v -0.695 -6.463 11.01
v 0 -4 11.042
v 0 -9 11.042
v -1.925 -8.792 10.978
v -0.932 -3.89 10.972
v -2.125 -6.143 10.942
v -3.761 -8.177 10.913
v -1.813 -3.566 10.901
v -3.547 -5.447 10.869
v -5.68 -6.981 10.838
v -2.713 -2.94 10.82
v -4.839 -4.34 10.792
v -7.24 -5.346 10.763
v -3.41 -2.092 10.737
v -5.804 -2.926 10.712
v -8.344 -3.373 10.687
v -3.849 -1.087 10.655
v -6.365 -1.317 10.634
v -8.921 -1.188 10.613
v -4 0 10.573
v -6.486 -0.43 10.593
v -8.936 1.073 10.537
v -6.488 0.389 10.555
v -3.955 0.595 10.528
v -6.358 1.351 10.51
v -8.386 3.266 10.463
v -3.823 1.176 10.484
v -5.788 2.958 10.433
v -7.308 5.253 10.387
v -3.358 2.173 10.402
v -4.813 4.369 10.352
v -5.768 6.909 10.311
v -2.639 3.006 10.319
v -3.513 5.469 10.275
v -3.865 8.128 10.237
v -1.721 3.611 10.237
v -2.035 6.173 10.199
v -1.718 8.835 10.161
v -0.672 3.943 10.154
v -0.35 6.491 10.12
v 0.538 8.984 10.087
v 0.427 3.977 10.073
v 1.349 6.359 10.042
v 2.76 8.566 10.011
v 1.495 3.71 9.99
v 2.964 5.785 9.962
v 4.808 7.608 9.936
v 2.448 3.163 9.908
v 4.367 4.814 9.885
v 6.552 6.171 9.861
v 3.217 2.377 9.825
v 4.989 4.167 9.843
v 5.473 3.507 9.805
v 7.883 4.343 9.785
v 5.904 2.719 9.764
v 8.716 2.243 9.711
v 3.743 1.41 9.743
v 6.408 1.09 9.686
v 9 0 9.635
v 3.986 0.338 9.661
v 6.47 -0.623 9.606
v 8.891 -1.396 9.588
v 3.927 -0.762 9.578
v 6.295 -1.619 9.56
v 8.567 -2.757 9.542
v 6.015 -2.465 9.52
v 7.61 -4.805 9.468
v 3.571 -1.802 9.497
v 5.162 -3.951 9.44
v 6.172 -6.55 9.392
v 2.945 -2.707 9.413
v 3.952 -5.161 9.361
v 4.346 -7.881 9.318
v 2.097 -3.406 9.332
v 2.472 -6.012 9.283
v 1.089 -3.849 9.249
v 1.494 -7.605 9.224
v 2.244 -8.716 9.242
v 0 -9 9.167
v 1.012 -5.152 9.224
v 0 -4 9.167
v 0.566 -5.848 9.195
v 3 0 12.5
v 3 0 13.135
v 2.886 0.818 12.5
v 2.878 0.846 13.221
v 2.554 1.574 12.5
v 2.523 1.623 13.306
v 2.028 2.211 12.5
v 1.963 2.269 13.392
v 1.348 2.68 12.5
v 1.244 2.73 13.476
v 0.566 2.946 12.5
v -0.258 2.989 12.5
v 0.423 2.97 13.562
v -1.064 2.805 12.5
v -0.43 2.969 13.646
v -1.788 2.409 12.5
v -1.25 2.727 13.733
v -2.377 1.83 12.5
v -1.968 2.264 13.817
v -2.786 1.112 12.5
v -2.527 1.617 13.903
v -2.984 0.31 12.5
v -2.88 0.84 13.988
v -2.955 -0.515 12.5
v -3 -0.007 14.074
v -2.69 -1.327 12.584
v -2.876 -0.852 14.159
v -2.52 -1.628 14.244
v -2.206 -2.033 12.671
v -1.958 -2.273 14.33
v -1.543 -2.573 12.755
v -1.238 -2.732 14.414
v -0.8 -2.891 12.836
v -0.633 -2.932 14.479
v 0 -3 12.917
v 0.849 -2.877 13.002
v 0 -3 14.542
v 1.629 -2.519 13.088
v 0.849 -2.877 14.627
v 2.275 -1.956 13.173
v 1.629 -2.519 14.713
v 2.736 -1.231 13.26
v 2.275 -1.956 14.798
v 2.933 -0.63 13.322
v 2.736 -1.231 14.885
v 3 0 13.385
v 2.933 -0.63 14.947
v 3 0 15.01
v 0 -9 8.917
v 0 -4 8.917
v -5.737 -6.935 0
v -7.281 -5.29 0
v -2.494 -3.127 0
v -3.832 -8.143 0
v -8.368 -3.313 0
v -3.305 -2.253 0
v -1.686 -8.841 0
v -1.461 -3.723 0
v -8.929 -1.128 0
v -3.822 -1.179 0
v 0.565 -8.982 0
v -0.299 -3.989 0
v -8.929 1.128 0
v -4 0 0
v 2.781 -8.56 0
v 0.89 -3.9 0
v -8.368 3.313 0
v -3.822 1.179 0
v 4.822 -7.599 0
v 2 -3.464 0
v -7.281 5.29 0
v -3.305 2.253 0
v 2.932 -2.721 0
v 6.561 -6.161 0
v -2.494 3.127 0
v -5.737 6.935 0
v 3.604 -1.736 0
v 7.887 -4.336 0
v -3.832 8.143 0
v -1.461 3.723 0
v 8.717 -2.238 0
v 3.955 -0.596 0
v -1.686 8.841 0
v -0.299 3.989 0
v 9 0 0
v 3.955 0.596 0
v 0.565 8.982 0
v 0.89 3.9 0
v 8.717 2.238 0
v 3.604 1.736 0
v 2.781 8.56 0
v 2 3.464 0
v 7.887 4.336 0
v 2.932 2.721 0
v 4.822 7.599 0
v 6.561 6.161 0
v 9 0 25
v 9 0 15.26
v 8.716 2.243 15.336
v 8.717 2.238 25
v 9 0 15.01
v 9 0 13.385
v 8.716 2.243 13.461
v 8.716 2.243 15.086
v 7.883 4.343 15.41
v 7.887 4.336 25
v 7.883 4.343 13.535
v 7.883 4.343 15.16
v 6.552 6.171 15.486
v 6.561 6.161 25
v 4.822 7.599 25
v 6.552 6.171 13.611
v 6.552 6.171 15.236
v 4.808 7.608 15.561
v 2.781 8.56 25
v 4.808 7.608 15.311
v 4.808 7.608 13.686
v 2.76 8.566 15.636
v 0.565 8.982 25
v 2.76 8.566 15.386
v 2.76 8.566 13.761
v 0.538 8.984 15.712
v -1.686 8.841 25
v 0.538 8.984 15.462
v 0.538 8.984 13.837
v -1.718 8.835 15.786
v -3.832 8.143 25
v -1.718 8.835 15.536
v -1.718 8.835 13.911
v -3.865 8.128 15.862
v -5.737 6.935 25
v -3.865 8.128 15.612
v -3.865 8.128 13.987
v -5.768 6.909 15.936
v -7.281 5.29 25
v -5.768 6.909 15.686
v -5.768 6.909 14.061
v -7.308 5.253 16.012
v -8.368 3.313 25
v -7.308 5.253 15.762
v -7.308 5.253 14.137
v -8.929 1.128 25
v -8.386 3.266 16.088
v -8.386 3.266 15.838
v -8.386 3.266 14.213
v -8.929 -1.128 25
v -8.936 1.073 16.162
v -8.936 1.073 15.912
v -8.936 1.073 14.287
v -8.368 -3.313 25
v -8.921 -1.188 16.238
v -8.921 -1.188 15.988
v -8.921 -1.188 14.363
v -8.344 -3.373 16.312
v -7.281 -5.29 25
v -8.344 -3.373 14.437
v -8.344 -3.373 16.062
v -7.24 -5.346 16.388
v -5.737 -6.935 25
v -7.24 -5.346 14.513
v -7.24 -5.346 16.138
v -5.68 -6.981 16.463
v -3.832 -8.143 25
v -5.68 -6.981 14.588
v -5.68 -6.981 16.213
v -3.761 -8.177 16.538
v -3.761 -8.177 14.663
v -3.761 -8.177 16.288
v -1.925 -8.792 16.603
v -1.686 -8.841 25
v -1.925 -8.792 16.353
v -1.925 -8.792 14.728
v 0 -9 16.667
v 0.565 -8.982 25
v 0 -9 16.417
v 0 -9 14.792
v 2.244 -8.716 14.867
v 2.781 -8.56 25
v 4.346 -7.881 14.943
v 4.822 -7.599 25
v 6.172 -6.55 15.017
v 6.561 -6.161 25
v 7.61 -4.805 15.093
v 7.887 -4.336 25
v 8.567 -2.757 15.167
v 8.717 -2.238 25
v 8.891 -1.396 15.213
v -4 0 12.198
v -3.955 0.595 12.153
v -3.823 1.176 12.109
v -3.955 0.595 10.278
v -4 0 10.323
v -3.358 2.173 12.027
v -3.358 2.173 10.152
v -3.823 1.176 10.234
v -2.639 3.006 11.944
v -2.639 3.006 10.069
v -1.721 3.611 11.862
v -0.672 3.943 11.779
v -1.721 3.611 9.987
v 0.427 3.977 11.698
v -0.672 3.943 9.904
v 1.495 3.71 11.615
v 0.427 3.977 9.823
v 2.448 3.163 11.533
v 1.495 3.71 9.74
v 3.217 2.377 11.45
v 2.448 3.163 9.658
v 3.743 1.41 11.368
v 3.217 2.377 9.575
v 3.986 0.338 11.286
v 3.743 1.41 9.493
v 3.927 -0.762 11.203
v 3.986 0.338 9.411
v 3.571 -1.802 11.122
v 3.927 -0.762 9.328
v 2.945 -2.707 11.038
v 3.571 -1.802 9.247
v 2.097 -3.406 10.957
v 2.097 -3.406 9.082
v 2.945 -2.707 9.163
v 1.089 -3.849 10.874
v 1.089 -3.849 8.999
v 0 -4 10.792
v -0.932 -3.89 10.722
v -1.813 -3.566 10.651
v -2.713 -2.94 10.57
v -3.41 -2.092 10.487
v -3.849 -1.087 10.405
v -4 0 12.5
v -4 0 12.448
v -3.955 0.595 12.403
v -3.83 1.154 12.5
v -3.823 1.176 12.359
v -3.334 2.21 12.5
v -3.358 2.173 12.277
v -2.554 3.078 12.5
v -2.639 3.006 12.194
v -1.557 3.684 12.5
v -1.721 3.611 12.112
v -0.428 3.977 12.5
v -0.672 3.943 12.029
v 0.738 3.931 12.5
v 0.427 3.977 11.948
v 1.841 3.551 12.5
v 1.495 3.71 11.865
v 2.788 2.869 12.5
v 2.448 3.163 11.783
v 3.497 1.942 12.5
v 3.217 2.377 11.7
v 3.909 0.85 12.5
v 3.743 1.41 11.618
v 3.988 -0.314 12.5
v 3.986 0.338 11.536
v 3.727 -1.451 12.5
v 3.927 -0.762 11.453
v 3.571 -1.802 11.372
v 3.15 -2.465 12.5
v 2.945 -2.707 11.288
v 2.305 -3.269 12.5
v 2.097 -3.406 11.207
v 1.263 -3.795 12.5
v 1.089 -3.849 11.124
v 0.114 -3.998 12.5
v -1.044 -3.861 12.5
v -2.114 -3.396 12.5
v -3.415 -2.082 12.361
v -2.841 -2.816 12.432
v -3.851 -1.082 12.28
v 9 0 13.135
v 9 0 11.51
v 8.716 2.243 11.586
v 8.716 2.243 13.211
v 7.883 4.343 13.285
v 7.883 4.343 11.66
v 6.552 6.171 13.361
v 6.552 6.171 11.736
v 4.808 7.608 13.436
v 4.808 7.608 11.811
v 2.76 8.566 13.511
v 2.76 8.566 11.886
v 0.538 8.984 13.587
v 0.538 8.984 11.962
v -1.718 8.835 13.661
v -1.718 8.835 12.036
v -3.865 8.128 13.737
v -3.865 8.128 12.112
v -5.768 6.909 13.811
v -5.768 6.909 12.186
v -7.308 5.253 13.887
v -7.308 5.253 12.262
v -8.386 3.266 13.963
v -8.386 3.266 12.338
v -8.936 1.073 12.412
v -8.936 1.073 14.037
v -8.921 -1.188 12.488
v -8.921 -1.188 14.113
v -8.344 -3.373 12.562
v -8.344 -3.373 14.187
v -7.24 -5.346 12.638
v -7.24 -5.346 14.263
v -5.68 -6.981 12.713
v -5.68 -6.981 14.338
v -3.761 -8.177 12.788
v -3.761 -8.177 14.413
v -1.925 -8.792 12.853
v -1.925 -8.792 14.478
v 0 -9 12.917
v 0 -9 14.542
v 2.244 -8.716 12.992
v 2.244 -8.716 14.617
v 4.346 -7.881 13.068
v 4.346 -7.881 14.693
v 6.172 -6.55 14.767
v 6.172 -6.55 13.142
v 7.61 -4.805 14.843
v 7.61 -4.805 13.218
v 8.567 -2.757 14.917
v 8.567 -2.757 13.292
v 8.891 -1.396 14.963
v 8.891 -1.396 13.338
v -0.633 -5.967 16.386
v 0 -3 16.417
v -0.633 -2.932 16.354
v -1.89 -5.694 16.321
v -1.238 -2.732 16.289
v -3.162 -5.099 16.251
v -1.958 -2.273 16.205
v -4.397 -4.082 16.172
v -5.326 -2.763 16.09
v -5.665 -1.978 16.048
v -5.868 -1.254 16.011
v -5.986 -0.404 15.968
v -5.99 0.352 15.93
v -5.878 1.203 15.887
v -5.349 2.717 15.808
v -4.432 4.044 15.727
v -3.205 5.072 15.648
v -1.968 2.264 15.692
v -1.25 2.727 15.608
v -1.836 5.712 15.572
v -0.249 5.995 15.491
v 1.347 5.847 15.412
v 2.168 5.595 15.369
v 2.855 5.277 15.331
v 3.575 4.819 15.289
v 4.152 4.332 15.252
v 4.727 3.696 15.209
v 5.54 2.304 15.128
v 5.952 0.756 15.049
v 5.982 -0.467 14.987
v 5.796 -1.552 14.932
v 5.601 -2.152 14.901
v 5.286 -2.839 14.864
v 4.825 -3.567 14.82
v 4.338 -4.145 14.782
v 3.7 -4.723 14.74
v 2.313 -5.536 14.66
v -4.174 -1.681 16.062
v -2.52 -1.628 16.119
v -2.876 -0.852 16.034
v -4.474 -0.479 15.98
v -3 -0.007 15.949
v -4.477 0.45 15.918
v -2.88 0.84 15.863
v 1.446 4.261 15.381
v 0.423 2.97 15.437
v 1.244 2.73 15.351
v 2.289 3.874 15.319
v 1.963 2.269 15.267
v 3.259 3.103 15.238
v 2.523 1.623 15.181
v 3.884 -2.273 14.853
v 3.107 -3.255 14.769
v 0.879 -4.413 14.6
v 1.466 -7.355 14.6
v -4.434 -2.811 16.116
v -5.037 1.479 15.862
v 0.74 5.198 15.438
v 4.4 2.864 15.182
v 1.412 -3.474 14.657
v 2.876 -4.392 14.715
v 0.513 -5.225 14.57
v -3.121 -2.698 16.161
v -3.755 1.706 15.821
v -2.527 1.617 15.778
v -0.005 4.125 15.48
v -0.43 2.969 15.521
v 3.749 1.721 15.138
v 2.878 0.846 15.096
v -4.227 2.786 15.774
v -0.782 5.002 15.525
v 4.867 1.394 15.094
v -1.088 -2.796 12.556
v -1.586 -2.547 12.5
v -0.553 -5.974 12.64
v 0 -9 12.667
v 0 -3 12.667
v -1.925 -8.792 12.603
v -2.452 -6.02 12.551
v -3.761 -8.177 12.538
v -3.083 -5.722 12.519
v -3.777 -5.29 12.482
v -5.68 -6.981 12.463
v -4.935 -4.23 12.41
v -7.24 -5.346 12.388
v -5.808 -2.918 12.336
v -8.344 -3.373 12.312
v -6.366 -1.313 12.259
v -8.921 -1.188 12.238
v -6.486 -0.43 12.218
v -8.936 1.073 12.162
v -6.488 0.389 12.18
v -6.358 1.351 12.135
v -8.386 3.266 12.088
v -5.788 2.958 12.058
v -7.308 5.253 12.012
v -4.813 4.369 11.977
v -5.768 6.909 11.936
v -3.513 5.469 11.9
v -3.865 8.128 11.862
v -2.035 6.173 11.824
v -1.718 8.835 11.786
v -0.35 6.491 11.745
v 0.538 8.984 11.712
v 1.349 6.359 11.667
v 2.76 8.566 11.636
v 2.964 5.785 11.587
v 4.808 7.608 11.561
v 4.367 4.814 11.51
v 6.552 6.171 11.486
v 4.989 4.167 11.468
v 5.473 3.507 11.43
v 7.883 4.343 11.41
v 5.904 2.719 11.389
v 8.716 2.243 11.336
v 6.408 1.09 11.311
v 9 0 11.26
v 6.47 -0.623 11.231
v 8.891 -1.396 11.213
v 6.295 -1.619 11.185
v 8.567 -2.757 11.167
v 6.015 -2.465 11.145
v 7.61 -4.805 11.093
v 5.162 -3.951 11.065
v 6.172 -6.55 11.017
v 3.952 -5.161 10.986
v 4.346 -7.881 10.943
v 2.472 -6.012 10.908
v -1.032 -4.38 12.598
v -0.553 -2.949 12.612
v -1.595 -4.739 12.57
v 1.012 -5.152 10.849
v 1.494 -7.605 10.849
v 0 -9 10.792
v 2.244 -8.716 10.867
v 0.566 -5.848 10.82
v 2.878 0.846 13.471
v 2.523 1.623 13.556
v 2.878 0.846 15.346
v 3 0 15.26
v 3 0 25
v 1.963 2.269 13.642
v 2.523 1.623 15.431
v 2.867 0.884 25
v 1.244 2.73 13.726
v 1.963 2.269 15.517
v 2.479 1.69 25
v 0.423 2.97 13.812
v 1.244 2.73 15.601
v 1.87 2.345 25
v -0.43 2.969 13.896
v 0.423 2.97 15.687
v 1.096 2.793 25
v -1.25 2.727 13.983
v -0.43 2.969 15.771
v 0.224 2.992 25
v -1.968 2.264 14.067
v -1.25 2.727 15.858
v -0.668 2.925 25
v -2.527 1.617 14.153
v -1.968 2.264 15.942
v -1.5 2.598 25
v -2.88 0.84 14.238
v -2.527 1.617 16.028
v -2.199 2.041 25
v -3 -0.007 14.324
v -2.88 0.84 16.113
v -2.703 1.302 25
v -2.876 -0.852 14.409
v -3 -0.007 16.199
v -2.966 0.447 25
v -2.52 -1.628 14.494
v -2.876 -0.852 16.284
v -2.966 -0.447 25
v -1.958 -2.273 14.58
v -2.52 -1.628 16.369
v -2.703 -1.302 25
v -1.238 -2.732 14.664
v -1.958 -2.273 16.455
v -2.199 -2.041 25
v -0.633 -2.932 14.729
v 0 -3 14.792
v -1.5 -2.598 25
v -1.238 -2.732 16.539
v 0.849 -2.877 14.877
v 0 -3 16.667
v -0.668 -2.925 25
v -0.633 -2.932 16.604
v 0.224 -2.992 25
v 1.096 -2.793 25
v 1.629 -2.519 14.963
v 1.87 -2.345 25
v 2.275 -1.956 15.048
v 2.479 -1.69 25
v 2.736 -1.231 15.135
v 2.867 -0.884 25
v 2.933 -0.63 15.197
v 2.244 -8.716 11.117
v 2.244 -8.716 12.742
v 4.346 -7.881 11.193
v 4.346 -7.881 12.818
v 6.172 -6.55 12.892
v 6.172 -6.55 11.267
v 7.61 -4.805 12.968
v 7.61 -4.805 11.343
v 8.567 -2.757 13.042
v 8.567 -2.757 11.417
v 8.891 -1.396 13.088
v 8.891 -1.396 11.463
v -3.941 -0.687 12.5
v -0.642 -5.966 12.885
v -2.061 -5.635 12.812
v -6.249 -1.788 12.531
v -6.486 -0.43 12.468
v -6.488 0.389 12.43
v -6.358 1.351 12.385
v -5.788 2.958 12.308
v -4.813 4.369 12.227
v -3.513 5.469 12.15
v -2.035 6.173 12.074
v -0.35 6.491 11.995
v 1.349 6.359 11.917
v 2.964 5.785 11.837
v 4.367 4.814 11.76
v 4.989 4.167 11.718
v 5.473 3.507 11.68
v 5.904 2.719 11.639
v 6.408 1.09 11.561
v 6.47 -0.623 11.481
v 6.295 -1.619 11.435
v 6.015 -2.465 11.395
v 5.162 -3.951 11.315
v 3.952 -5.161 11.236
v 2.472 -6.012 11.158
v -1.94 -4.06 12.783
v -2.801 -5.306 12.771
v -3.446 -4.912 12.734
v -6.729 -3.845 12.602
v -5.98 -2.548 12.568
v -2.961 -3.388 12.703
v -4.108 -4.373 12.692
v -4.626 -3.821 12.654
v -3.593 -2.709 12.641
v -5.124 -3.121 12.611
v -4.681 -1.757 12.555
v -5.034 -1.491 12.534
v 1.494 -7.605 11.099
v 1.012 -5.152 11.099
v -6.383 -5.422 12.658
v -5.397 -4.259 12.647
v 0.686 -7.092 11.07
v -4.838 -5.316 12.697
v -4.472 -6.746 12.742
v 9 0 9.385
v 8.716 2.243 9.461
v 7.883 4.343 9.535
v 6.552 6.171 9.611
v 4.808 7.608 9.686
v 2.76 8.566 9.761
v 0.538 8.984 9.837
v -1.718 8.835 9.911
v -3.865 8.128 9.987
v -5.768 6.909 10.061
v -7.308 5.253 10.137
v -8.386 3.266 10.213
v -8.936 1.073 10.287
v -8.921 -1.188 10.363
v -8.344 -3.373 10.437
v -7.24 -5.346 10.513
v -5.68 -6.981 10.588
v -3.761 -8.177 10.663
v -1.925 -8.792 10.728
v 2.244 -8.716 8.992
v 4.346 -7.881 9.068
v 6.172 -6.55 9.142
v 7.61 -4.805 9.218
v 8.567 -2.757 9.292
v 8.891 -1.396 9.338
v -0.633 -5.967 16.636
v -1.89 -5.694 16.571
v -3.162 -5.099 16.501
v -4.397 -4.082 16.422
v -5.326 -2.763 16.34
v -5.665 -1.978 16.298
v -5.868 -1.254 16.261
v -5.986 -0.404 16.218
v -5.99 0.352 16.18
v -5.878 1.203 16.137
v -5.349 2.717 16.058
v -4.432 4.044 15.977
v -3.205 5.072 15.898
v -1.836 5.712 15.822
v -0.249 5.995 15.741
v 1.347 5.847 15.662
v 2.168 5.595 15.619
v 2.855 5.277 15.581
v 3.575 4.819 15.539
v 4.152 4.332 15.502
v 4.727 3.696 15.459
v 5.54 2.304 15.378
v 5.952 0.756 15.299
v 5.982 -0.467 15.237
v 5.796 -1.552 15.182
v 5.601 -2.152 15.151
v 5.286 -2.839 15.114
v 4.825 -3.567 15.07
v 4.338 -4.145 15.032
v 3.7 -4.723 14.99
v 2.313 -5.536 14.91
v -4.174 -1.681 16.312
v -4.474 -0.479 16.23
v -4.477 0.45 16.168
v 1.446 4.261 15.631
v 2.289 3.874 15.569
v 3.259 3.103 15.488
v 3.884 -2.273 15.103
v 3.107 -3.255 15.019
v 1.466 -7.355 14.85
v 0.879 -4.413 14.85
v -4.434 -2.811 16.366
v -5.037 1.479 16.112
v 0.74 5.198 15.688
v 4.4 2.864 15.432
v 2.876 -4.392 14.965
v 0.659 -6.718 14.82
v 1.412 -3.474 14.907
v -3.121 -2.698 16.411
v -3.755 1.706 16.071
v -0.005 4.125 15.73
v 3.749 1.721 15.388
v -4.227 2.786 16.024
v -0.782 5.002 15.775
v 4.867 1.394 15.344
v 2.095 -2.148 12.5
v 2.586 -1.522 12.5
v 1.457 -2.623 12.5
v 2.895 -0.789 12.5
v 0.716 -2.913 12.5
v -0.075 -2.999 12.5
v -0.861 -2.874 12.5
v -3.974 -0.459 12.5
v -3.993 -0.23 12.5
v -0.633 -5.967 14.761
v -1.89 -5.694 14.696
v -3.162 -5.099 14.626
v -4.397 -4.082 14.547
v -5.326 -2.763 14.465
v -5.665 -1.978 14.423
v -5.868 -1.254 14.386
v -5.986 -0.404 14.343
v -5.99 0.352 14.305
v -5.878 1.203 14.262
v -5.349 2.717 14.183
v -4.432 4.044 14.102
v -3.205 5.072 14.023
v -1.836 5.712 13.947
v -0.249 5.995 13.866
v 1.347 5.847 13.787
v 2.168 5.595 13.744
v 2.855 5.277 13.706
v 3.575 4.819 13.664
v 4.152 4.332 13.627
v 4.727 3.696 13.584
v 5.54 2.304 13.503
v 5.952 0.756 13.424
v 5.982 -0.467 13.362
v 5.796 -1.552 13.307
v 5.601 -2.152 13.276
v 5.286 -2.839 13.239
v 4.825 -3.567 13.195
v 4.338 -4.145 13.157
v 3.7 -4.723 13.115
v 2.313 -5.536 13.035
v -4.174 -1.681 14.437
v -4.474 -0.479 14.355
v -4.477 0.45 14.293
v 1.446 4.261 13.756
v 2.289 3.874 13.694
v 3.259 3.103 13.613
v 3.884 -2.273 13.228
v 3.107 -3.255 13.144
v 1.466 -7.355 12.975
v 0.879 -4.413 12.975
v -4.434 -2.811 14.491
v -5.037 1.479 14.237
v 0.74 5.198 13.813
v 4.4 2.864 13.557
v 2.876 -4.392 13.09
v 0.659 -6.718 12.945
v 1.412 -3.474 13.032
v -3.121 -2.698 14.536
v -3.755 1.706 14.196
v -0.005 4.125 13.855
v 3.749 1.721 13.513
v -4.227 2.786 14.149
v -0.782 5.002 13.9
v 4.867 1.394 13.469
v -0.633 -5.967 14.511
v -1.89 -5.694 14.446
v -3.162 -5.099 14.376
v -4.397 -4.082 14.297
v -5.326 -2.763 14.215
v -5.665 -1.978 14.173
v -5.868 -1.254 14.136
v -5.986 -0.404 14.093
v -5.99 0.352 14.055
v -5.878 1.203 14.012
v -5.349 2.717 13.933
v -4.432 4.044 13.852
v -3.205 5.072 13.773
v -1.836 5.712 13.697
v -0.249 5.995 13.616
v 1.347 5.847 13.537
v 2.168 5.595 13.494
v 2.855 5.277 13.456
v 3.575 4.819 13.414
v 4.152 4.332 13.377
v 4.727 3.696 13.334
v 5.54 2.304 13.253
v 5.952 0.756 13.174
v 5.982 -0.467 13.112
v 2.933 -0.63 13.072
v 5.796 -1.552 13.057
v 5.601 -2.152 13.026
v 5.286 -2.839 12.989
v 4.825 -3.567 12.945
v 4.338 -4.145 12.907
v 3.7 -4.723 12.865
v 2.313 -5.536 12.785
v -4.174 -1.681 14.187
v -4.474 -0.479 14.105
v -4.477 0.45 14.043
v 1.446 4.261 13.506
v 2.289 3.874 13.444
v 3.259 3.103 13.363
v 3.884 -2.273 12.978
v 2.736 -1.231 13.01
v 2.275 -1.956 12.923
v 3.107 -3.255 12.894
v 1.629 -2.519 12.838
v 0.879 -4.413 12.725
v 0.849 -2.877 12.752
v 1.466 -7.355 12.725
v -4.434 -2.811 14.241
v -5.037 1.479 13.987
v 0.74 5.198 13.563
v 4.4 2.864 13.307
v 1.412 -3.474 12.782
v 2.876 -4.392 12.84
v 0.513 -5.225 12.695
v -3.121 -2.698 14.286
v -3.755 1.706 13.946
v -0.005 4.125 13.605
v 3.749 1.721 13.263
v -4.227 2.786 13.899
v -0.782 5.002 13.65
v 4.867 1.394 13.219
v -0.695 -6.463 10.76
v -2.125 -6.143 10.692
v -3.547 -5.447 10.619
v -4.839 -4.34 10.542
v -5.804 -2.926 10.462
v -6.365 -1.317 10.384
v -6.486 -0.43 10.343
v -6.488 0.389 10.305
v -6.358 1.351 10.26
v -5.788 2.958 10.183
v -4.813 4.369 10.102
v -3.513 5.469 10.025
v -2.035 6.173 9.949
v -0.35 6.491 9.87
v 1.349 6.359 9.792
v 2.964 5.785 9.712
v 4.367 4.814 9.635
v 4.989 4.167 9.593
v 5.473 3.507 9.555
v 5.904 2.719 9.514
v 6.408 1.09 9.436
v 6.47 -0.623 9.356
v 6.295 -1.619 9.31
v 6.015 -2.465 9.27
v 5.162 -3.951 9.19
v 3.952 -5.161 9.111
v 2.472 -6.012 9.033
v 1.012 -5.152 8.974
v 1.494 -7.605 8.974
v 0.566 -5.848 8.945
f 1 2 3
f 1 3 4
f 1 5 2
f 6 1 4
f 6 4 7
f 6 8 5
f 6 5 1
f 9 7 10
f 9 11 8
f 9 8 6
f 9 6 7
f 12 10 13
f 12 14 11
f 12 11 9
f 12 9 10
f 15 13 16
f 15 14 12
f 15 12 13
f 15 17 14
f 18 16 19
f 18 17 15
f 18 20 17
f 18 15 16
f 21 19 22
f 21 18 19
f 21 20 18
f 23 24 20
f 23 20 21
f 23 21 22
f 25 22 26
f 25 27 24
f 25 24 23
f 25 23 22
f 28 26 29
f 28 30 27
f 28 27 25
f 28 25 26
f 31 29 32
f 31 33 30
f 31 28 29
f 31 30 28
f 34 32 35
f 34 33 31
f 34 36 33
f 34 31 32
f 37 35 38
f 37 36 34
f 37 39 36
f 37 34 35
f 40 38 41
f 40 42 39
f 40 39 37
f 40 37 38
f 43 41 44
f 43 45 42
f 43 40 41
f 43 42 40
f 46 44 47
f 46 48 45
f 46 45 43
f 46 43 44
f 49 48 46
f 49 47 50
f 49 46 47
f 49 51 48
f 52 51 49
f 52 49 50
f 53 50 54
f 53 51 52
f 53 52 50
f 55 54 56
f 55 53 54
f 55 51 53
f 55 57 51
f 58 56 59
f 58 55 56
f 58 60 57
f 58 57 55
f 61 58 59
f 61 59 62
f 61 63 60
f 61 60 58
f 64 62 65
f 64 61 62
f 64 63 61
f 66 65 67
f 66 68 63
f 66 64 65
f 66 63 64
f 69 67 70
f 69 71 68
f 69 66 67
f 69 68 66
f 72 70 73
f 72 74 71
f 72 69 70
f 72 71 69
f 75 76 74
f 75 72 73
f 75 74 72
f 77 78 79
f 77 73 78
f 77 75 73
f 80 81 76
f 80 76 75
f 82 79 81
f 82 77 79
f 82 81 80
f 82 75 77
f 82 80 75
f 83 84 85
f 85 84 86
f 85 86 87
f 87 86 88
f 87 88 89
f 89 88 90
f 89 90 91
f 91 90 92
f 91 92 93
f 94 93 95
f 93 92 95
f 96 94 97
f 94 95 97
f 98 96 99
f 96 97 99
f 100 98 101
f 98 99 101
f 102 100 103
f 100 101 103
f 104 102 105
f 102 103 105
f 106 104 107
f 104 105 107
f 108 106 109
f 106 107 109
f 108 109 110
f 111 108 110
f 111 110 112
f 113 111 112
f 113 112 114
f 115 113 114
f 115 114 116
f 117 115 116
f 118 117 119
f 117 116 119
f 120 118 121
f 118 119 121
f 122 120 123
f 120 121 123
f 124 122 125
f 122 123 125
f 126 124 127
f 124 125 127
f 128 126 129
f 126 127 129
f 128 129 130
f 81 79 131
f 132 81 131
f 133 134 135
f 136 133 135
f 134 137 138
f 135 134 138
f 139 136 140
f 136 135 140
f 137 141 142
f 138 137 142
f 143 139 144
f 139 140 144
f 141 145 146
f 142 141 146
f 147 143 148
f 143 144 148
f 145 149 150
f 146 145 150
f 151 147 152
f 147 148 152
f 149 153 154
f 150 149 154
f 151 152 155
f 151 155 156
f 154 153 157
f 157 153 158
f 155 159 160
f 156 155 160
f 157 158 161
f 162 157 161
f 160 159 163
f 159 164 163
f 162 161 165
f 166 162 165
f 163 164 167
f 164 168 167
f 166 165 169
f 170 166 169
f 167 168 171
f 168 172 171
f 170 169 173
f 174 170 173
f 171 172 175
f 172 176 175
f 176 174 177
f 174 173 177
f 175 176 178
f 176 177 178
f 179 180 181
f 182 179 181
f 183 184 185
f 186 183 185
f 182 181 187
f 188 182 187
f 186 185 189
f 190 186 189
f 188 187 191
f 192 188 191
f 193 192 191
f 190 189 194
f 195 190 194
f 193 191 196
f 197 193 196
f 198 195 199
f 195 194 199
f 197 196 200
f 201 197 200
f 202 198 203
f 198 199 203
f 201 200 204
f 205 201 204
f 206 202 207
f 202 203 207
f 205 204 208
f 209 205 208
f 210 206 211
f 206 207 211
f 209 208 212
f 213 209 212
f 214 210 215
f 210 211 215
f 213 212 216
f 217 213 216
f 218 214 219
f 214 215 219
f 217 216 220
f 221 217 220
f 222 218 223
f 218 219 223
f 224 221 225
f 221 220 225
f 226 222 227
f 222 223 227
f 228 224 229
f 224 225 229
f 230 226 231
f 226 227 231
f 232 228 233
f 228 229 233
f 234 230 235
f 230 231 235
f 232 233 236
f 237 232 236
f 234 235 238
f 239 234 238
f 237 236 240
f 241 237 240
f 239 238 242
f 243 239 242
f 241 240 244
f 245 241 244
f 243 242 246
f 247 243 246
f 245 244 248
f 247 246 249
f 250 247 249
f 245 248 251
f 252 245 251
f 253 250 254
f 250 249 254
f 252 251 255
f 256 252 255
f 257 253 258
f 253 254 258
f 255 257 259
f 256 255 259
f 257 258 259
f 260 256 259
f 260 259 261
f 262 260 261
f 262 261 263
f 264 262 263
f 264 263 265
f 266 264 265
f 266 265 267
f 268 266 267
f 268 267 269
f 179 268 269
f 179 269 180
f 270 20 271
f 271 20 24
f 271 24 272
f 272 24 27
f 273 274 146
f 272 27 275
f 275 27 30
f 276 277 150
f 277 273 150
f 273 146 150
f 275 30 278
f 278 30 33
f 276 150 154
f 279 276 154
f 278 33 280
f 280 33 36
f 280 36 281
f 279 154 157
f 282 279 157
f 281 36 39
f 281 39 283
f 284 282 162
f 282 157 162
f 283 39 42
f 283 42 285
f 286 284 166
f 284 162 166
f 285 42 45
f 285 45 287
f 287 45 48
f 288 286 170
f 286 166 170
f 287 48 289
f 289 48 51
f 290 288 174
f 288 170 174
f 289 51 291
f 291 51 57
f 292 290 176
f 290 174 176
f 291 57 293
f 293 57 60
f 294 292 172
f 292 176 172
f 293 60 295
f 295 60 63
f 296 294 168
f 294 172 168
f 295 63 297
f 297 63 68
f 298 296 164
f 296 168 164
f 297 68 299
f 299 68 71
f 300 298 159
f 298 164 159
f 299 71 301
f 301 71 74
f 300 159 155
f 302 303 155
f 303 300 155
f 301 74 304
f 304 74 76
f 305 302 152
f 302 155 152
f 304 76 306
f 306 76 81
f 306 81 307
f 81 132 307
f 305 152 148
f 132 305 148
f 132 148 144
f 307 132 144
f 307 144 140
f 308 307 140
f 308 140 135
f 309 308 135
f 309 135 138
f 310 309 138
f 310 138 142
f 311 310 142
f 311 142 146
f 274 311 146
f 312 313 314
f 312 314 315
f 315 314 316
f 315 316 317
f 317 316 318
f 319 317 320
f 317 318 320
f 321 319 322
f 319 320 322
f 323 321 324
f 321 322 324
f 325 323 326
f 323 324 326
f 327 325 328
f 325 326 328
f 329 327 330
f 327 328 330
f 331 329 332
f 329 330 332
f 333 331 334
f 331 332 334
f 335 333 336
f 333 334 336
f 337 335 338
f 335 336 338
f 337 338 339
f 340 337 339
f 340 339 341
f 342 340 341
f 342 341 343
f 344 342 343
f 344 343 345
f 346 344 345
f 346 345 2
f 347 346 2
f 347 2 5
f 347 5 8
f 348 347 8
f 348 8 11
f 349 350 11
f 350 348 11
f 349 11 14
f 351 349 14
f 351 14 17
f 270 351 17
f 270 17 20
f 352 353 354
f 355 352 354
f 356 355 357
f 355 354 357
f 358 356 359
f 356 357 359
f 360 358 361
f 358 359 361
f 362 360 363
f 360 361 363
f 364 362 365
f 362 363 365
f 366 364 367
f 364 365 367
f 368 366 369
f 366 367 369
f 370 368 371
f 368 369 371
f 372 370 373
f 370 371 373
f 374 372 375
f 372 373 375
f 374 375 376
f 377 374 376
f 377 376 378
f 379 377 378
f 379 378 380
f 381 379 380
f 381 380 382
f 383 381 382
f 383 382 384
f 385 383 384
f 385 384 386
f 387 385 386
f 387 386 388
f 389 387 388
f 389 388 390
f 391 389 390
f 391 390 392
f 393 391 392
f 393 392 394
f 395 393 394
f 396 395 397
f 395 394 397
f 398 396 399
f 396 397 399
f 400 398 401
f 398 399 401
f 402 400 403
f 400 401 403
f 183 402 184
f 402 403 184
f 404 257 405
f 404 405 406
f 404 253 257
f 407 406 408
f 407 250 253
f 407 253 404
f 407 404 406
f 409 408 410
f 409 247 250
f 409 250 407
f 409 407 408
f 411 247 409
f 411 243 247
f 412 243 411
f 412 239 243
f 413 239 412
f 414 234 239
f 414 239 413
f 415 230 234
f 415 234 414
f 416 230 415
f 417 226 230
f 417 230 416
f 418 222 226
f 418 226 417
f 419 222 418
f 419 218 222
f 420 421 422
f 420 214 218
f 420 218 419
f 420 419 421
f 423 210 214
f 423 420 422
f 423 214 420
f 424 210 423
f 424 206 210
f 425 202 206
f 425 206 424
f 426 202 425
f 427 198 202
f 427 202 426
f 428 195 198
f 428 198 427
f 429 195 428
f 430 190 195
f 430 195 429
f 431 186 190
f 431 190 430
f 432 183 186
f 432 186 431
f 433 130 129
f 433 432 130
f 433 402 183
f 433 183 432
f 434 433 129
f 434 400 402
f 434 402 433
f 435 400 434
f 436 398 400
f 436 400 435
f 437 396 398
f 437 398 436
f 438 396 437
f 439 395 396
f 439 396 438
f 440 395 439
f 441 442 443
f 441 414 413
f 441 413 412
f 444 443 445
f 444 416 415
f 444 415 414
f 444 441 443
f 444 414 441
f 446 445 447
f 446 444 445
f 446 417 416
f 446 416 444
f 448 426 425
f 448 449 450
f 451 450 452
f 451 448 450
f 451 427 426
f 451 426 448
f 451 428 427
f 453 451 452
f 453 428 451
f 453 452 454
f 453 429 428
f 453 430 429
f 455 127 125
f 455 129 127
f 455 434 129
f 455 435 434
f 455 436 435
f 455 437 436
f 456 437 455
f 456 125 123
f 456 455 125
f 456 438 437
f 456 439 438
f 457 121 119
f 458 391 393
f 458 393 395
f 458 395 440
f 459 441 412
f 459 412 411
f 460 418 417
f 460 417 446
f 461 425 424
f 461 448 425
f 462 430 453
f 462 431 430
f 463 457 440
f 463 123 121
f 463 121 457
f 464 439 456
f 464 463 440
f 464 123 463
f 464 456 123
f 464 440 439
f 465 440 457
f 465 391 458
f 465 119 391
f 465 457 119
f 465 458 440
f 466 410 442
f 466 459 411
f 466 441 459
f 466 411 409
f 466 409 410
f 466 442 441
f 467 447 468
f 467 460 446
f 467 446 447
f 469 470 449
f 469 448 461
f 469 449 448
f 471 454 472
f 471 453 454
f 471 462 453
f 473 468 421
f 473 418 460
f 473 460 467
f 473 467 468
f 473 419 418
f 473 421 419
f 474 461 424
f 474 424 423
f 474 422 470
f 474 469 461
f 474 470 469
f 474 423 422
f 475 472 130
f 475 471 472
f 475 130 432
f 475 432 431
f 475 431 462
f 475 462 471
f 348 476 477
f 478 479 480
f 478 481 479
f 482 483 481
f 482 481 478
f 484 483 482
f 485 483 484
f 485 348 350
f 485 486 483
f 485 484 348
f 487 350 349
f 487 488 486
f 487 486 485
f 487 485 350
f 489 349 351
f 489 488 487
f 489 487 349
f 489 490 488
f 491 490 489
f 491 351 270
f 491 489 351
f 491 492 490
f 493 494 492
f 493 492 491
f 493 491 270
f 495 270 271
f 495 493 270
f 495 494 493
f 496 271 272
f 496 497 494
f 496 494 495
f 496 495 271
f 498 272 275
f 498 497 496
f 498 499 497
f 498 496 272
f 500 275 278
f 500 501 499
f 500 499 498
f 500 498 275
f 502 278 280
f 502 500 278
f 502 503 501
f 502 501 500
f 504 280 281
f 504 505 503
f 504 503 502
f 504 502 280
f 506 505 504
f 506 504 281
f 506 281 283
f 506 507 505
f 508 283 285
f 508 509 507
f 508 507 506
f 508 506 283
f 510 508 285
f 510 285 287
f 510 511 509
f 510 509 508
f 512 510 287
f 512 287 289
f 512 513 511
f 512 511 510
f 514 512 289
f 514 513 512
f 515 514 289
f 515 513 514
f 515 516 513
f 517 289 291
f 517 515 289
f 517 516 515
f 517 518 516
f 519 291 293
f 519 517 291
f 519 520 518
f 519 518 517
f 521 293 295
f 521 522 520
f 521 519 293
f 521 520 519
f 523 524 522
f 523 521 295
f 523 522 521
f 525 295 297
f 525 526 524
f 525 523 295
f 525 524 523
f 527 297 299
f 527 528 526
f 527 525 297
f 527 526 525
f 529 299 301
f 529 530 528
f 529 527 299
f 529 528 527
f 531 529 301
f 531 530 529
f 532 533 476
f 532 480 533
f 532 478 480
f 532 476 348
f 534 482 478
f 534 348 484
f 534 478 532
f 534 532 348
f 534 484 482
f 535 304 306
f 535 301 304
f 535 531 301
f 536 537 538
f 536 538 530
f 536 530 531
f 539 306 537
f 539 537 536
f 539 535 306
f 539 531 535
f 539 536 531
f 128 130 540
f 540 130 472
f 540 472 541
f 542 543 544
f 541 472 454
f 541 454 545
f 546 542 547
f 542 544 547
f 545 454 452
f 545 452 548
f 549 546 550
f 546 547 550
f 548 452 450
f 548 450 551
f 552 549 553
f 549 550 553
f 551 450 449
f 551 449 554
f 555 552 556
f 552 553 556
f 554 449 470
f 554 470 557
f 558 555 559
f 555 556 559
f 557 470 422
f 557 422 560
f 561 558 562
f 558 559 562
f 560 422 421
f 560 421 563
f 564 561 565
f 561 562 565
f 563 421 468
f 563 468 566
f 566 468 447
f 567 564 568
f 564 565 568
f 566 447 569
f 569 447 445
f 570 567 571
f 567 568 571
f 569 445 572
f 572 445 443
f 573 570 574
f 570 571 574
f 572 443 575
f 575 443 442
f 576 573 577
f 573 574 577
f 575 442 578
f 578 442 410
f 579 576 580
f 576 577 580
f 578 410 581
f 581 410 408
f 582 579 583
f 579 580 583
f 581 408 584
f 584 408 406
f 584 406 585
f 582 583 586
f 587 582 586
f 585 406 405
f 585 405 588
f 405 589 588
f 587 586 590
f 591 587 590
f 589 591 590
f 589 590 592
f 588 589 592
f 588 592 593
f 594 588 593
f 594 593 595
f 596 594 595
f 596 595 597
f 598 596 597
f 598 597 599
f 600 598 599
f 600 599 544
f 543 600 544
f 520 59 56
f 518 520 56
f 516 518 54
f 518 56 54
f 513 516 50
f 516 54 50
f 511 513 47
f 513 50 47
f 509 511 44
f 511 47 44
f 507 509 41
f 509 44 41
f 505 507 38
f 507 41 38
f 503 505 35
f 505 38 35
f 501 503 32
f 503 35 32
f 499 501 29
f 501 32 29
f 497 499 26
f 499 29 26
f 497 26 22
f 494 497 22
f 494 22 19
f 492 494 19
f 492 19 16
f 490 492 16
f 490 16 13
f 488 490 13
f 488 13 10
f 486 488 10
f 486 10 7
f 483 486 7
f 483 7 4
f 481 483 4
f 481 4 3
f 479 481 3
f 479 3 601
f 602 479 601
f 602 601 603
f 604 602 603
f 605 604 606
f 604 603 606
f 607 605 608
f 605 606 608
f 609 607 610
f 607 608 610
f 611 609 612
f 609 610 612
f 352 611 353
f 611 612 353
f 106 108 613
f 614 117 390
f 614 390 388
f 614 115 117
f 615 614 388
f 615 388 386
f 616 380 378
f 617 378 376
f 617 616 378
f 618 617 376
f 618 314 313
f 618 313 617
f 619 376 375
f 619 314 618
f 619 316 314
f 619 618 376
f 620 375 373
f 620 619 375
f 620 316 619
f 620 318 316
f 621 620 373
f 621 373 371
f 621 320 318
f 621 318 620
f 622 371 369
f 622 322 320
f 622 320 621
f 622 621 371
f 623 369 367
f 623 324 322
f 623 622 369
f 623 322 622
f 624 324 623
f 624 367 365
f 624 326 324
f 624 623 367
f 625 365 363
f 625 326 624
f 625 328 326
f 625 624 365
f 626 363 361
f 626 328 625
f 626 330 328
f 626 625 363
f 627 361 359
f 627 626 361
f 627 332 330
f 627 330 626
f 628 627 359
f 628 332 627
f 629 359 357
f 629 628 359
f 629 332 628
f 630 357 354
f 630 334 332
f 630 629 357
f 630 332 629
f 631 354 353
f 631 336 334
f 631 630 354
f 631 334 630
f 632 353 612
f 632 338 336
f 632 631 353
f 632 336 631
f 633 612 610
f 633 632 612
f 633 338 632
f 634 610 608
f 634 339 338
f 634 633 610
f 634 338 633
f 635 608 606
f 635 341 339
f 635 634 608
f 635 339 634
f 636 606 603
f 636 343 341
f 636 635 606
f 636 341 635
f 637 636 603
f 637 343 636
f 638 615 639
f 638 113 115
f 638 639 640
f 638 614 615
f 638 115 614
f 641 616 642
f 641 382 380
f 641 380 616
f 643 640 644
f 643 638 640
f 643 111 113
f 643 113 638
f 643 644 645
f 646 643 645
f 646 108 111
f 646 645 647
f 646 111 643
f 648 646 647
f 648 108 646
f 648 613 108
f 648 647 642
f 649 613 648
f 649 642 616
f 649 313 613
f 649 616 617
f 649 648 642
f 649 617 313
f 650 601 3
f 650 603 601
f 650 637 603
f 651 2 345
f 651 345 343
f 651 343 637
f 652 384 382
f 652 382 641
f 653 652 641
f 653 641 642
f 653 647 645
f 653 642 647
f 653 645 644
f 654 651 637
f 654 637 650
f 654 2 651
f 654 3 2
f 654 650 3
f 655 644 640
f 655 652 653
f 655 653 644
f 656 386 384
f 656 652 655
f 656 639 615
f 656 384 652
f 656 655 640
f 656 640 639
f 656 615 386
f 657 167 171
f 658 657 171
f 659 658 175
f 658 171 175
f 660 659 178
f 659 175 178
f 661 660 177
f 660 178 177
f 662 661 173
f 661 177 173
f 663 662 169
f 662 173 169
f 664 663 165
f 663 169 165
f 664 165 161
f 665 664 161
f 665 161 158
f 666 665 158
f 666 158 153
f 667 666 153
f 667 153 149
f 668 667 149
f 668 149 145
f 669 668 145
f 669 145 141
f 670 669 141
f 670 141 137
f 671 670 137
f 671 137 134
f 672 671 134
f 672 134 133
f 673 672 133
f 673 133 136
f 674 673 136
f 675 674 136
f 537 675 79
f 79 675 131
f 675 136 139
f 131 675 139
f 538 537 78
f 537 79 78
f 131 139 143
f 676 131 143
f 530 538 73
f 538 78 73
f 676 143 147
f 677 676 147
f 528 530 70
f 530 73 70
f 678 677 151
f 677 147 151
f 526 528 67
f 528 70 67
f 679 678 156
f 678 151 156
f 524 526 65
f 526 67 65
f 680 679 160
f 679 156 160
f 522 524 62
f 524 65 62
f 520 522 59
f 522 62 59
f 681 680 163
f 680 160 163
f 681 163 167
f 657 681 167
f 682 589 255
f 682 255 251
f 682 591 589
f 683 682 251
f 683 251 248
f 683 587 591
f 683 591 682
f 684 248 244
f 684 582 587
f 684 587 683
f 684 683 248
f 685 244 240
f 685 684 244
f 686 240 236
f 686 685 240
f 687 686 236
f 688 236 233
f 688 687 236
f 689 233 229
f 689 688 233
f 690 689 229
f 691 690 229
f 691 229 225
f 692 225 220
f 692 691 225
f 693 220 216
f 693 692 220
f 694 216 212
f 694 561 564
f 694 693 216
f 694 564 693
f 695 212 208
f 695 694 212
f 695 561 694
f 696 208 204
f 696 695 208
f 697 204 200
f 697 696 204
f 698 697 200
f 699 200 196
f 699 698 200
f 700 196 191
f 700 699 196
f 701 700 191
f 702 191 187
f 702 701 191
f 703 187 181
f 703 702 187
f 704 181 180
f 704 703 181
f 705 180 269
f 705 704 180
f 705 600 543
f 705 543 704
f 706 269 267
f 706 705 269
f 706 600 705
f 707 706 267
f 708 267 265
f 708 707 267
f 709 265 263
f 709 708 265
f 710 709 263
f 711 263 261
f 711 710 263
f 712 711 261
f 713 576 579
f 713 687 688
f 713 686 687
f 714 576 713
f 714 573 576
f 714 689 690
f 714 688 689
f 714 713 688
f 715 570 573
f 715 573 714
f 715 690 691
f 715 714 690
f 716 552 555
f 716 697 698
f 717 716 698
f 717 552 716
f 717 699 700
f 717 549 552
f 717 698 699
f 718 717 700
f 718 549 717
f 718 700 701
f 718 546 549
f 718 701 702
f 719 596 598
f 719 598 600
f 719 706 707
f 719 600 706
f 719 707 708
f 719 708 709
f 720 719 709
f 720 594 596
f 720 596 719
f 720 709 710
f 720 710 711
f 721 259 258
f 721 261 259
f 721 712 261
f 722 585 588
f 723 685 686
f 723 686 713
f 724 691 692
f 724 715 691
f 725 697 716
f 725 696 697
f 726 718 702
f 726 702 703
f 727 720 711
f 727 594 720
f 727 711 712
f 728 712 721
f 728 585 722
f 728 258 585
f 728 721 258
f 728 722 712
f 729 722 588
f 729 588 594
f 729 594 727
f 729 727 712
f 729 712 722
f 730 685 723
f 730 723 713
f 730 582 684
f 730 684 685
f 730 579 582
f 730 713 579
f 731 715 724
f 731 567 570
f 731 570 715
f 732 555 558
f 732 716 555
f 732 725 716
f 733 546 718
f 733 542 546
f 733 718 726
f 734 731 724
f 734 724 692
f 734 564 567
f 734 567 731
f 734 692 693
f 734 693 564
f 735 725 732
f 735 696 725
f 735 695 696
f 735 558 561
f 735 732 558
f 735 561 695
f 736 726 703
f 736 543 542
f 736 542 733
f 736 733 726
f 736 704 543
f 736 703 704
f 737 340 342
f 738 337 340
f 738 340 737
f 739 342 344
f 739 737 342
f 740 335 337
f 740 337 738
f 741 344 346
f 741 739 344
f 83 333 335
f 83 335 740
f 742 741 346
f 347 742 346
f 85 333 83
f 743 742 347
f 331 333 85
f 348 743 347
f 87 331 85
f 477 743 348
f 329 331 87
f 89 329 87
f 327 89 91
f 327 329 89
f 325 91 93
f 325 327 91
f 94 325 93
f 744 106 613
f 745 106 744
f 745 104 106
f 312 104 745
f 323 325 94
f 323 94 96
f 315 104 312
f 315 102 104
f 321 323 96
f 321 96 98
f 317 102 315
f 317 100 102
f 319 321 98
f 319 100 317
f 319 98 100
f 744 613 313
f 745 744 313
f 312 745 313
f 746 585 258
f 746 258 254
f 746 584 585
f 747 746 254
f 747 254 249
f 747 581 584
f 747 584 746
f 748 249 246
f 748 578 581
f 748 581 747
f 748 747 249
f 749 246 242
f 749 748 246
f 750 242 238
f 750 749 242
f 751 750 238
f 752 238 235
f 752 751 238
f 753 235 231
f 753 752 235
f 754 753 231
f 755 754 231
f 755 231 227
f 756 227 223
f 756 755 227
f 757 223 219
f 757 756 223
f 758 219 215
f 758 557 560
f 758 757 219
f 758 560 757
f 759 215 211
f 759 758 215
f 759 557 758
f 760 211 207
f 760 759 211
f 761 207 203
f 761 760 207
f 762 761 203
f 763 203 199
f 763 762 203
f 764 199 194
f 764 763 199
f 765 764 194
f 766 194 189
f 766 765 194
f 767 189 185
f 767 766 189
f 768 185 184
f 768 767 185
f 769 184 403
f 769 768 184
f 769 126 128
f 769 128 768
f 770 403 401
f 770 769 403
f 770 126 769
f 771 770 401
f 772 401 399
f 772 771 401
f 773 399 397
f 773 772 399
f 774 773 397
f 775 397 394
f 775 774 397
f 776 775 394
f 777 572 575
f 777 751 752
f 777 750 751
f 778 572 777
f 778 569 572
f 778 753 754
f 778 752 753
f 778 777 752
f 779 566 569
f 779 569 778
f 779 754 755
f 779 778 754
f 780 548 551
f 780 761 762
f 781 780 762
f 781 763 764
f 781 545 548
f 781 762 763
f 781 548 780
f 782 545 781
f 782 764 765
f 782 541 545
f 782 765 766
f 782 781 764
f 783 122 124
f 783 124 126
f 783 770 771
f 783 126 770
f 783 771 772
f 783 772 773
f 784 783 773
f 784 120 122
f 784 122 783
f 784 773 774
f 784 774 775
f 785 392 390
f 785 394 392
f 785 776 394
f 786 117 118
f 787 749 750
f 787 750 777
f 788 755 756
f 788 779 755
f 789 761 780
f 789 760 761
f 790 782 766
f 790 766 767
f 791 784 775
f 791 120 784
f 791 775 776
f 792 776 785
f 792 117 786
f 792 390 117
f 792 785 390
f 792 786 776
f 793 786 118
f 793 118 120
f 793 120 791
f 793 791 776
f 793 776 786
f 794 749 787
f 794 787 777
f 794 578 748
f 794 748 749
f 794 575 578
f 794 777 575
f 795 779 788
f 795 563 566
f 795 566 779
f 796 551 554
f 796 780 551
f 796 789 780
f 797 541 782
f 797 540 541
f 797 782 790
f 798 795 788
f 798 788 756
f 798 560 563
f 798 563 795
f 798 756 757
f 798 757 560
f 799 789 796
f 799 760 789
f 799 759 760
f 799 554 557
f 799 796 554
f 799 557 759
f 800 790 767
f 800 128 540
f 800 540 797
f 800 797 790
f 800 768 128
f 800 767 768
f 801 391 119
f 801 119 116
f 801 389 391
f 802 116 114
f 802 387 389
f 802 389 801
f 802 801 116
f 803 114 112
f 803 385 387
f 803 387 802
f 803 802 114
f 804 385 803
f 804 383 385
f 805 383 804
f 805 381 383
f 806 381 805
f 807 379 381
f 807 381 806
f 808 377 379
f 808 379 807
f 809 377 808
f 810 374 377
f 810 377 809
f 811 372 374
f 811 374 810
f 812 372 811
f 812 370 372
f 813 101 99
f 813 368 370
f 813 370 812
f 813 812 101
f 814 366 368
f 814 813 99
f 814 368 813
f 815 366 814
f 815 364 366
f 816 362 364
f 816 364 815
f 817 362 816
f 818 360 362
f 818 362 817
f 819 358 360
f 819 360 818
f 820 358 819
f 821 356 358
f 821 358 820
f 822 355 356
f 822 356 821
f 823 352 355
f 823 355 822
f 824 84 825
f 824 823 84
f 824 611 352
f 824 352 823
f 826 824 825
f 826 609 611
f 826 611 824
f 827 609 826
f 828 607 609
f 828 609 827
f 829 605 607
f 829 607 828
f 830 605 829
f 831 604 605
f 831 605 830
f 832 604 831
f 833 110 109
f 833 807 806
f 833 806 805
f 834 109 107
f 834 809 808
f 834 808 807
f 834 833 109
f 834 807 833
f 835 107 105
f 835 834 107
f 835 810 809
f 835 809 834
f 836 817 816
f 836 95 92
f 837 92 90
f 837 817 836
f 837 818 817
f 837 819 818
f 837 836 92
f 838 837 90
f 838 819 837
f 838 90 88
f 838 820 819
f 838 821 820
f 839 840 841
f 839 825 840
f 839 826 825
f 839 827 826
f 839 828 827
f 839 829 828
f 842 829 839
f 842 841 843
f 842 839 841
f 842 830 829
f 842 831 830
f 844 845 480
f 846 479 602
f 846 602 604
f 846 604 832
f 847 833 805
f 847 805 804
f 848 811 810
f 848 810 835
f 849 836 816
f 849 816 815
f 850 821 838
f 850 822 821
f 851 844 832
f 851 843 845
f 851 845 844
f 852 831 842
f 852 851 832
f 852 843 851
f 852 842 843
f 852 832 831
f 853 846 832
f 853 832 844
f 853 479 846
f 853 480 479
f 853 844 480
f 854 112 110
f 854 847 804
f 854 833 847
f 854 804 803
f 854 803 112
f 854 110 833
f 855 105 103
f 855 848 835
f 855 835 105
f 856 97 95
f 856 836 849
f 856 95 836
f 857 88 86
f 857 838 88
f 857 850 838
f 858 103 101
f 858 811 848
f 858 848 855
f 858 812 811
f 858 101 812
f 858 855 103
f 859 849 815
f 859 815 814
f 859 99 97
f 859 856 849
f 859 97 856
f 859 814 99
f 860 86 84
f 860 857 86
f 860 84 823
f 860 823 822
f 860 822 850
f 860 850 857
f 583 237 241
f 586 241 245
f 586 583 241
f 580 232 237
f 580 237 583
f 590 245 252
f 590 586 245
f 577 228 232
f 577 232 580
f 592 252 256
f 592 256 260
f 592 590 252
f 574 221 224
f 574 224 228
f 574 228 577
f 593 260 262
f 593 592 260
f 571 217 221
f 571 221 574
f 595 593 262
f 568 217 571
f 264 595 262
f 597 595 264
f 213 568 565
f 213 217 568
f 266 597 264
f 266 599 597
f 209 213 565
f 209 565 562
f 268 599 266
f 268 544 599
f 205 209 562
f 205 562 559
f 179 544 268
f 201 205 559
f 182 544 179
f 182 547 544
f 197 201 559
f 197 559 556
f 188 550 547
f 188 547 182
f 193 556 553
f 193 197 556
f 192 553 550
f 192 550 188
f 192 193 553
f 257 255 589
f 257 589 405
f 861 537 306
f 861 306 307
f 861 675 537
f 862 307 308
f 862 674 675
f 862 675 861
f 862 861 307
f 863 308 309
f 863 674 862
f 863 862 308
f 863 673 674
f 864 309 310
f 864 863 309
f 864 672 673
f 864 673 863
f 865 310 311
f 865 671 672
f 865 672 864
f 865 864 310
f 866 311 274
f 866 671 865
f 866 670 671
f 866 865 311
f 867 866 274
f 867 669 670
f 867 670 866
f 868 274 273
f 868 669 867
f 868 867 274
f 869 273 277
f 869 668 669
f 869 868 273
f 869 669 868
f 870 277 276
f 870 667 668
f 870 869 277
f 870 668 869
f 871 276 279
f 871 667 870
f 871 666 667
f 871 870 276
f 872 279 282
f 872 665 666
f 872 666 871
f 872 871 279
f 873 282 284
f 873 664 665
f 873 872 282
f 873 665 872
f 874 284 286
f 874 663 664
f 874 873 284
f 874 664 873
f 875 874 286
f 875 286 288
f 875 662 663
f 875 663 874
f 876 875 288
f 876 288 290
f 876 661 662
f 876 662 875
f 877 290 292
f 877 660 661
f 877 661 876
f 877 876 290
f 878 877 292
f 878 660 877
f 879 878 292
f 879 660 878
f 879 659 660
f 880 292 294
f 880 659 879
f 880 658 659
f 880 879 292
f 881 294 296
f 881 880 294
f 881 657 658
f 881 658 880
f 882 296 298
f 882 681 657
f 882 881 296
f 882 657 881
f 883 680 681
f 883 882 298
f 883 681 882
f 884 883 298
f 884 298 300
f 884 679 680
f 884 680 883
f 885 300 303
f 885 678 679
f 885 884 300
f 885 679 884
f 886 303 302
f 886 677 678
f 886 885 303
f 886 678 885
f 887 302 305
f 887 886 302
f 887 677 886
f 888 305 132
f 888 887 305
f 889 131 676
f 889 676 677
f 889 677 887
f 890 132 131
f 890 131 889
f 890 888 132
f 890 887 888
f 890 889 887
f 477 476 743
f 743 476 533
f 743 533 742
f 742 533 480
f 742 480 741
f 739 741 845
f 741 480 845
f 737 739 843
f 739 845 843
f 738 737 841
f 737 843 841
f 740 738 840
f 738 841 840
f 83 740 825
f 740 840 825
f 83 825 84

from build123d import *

# Parameters (mm, degrees)
SKETCH1_R           = 9
BOSS_EXTRUDE1_DEPTH = 25
SKETCH2_R           = 3
CUT_EXTRUDE1_DEPTH  = 25
SKETCH3_R           = 4
CUT_EXTRUDE2_DEPTH  = 12.5
CUT_SWEEP1_PITCH    = 1.875


with BuildPart() as part:
    # Sketch1 → Boss-Extrude1 (new body)
    with BuildSketch(Plane.XY):
        Circle(SKETCH1_R)
    extrude(amount=BOSS_EXTRUDE1_DEPTH)

    # Sketch2 → Cut-Extrude1 (cut)
    with BuildSketch(Plane.XY.offset(25)):
        Circle(SKETCH2_R)
    extrude(amount=-CUT_EXTRUDE1_DEPTH, mode=Mode.SUBTRACT)

    # Sketch3 → Cut-Extrude2 (cut)
    with BuildSketch(Plane(origin=(0, 0, 0), x_dir=(-1, 0, 0), z_dir=(0, 0, -1))):
        Circle(SKETCH3_R)
    extrude(amount=-CUT_EXTRUDE2_DEPTH, mode=Mode.SUBTRACT)

    # Cut-Sweep1: the profile of Sketch4 screwed along a right-hand helix of 4 turns, 10 arcs to a turn; built about Z, then put on its axis
    cut_sweep1_z = Axis((0, 0, 0), (0, 0, 1))
    cut_sweep1_corners = [(1.343280354, 0, 0), (1.343280354, 0, 0.25), (9.561008436, 0, 0.25), (9.561008436, 0, 0)]
    with BuildLine(mode=Mode.PRIVATE) as cut_sweep1_profile:
        Line(cut_sweep1_corners[0], cut_sweep1_corners[1])
        Line(cut_sweep1_corners[1], cut_sweep1_corners[2])
        Line(cut_sweep1_corners[2], cut_sweep1_corners[3])
        Line(cut_sweep1_corners[3], cut_sweep1_corners[0])
    cut_sweep1_cap = Face(cut_sweep1_profile.wire())
    cut_sweep1_turn_angles = [0, 18, 36, 54, 72, 90, 108, 126, 144, 162, 180, 198, 216, 234, 252, 270, 288, 306, 324, 342, 360]
    cut_sweep1_turn_weights = [1, 0.9510565162951535, 1, 0.9510565162951535, 1, 0.9510565162951535, 1, 0.9510565162951535, 1, 0.9510565162951535, 1, 0.9510565162951535, 1, 0.9510565162951535, 1, 0.9510565162951535, 1, 0.9510565162951535, 1, 0.9510565162951535, 1]
    cut_sweep1_turn_rails = [Edge.make_bspline([Vector(p[0], p[1], 0).rotate(cut_sweep1_z, cut_sweep1_turn_angles[k]) / cut_sweep1_turn_weights[k] + Vector(0, 0, p[2] + CUT_SWEEP1_PITCH * cut_sweep1_turn_angles[k] / 360) for k in range(21)], [0, 0, 0, 1, 1, 2, 2, 3, 3, 4, 4, 5, 5, 6, 6, 7, 7, 8, 8, 9, 9, 10, 10, 10], 2, cut_sweep1_turn_weights) for p in cut_sweep1_corners]
    cut_sweep1_turn_sides = [Face.make_surface_from_curves(cut_sweep1_turn_rails[p[0]], cut_sweep1_turn_rails[p[1]]) for p in [(0, 1), (1, 2), (2, 3), (3, 0)]]
    cut_sweep1 = Plane(origin=(0, 0, 16.66666667), x_dir=(0, -1, 0), z_dir=(0, 0, -1)) * Solid(Shell([*[p.moved(Location((0, 0, CUT_SWEEP1_PITCH * i))) for i in range(4) for p in cut_sweep1_turn_sides], cut_sweep1_cap, cut_sweep1_cap.rotate(cut_sweep1_z, 1440).moved(Location((0, 0, CUT_SWEEP1_PITCH * 1440 / 360)))]))
    add(cut_sweep1, mode=Mode.SUBTRACT)


solid = part.part
